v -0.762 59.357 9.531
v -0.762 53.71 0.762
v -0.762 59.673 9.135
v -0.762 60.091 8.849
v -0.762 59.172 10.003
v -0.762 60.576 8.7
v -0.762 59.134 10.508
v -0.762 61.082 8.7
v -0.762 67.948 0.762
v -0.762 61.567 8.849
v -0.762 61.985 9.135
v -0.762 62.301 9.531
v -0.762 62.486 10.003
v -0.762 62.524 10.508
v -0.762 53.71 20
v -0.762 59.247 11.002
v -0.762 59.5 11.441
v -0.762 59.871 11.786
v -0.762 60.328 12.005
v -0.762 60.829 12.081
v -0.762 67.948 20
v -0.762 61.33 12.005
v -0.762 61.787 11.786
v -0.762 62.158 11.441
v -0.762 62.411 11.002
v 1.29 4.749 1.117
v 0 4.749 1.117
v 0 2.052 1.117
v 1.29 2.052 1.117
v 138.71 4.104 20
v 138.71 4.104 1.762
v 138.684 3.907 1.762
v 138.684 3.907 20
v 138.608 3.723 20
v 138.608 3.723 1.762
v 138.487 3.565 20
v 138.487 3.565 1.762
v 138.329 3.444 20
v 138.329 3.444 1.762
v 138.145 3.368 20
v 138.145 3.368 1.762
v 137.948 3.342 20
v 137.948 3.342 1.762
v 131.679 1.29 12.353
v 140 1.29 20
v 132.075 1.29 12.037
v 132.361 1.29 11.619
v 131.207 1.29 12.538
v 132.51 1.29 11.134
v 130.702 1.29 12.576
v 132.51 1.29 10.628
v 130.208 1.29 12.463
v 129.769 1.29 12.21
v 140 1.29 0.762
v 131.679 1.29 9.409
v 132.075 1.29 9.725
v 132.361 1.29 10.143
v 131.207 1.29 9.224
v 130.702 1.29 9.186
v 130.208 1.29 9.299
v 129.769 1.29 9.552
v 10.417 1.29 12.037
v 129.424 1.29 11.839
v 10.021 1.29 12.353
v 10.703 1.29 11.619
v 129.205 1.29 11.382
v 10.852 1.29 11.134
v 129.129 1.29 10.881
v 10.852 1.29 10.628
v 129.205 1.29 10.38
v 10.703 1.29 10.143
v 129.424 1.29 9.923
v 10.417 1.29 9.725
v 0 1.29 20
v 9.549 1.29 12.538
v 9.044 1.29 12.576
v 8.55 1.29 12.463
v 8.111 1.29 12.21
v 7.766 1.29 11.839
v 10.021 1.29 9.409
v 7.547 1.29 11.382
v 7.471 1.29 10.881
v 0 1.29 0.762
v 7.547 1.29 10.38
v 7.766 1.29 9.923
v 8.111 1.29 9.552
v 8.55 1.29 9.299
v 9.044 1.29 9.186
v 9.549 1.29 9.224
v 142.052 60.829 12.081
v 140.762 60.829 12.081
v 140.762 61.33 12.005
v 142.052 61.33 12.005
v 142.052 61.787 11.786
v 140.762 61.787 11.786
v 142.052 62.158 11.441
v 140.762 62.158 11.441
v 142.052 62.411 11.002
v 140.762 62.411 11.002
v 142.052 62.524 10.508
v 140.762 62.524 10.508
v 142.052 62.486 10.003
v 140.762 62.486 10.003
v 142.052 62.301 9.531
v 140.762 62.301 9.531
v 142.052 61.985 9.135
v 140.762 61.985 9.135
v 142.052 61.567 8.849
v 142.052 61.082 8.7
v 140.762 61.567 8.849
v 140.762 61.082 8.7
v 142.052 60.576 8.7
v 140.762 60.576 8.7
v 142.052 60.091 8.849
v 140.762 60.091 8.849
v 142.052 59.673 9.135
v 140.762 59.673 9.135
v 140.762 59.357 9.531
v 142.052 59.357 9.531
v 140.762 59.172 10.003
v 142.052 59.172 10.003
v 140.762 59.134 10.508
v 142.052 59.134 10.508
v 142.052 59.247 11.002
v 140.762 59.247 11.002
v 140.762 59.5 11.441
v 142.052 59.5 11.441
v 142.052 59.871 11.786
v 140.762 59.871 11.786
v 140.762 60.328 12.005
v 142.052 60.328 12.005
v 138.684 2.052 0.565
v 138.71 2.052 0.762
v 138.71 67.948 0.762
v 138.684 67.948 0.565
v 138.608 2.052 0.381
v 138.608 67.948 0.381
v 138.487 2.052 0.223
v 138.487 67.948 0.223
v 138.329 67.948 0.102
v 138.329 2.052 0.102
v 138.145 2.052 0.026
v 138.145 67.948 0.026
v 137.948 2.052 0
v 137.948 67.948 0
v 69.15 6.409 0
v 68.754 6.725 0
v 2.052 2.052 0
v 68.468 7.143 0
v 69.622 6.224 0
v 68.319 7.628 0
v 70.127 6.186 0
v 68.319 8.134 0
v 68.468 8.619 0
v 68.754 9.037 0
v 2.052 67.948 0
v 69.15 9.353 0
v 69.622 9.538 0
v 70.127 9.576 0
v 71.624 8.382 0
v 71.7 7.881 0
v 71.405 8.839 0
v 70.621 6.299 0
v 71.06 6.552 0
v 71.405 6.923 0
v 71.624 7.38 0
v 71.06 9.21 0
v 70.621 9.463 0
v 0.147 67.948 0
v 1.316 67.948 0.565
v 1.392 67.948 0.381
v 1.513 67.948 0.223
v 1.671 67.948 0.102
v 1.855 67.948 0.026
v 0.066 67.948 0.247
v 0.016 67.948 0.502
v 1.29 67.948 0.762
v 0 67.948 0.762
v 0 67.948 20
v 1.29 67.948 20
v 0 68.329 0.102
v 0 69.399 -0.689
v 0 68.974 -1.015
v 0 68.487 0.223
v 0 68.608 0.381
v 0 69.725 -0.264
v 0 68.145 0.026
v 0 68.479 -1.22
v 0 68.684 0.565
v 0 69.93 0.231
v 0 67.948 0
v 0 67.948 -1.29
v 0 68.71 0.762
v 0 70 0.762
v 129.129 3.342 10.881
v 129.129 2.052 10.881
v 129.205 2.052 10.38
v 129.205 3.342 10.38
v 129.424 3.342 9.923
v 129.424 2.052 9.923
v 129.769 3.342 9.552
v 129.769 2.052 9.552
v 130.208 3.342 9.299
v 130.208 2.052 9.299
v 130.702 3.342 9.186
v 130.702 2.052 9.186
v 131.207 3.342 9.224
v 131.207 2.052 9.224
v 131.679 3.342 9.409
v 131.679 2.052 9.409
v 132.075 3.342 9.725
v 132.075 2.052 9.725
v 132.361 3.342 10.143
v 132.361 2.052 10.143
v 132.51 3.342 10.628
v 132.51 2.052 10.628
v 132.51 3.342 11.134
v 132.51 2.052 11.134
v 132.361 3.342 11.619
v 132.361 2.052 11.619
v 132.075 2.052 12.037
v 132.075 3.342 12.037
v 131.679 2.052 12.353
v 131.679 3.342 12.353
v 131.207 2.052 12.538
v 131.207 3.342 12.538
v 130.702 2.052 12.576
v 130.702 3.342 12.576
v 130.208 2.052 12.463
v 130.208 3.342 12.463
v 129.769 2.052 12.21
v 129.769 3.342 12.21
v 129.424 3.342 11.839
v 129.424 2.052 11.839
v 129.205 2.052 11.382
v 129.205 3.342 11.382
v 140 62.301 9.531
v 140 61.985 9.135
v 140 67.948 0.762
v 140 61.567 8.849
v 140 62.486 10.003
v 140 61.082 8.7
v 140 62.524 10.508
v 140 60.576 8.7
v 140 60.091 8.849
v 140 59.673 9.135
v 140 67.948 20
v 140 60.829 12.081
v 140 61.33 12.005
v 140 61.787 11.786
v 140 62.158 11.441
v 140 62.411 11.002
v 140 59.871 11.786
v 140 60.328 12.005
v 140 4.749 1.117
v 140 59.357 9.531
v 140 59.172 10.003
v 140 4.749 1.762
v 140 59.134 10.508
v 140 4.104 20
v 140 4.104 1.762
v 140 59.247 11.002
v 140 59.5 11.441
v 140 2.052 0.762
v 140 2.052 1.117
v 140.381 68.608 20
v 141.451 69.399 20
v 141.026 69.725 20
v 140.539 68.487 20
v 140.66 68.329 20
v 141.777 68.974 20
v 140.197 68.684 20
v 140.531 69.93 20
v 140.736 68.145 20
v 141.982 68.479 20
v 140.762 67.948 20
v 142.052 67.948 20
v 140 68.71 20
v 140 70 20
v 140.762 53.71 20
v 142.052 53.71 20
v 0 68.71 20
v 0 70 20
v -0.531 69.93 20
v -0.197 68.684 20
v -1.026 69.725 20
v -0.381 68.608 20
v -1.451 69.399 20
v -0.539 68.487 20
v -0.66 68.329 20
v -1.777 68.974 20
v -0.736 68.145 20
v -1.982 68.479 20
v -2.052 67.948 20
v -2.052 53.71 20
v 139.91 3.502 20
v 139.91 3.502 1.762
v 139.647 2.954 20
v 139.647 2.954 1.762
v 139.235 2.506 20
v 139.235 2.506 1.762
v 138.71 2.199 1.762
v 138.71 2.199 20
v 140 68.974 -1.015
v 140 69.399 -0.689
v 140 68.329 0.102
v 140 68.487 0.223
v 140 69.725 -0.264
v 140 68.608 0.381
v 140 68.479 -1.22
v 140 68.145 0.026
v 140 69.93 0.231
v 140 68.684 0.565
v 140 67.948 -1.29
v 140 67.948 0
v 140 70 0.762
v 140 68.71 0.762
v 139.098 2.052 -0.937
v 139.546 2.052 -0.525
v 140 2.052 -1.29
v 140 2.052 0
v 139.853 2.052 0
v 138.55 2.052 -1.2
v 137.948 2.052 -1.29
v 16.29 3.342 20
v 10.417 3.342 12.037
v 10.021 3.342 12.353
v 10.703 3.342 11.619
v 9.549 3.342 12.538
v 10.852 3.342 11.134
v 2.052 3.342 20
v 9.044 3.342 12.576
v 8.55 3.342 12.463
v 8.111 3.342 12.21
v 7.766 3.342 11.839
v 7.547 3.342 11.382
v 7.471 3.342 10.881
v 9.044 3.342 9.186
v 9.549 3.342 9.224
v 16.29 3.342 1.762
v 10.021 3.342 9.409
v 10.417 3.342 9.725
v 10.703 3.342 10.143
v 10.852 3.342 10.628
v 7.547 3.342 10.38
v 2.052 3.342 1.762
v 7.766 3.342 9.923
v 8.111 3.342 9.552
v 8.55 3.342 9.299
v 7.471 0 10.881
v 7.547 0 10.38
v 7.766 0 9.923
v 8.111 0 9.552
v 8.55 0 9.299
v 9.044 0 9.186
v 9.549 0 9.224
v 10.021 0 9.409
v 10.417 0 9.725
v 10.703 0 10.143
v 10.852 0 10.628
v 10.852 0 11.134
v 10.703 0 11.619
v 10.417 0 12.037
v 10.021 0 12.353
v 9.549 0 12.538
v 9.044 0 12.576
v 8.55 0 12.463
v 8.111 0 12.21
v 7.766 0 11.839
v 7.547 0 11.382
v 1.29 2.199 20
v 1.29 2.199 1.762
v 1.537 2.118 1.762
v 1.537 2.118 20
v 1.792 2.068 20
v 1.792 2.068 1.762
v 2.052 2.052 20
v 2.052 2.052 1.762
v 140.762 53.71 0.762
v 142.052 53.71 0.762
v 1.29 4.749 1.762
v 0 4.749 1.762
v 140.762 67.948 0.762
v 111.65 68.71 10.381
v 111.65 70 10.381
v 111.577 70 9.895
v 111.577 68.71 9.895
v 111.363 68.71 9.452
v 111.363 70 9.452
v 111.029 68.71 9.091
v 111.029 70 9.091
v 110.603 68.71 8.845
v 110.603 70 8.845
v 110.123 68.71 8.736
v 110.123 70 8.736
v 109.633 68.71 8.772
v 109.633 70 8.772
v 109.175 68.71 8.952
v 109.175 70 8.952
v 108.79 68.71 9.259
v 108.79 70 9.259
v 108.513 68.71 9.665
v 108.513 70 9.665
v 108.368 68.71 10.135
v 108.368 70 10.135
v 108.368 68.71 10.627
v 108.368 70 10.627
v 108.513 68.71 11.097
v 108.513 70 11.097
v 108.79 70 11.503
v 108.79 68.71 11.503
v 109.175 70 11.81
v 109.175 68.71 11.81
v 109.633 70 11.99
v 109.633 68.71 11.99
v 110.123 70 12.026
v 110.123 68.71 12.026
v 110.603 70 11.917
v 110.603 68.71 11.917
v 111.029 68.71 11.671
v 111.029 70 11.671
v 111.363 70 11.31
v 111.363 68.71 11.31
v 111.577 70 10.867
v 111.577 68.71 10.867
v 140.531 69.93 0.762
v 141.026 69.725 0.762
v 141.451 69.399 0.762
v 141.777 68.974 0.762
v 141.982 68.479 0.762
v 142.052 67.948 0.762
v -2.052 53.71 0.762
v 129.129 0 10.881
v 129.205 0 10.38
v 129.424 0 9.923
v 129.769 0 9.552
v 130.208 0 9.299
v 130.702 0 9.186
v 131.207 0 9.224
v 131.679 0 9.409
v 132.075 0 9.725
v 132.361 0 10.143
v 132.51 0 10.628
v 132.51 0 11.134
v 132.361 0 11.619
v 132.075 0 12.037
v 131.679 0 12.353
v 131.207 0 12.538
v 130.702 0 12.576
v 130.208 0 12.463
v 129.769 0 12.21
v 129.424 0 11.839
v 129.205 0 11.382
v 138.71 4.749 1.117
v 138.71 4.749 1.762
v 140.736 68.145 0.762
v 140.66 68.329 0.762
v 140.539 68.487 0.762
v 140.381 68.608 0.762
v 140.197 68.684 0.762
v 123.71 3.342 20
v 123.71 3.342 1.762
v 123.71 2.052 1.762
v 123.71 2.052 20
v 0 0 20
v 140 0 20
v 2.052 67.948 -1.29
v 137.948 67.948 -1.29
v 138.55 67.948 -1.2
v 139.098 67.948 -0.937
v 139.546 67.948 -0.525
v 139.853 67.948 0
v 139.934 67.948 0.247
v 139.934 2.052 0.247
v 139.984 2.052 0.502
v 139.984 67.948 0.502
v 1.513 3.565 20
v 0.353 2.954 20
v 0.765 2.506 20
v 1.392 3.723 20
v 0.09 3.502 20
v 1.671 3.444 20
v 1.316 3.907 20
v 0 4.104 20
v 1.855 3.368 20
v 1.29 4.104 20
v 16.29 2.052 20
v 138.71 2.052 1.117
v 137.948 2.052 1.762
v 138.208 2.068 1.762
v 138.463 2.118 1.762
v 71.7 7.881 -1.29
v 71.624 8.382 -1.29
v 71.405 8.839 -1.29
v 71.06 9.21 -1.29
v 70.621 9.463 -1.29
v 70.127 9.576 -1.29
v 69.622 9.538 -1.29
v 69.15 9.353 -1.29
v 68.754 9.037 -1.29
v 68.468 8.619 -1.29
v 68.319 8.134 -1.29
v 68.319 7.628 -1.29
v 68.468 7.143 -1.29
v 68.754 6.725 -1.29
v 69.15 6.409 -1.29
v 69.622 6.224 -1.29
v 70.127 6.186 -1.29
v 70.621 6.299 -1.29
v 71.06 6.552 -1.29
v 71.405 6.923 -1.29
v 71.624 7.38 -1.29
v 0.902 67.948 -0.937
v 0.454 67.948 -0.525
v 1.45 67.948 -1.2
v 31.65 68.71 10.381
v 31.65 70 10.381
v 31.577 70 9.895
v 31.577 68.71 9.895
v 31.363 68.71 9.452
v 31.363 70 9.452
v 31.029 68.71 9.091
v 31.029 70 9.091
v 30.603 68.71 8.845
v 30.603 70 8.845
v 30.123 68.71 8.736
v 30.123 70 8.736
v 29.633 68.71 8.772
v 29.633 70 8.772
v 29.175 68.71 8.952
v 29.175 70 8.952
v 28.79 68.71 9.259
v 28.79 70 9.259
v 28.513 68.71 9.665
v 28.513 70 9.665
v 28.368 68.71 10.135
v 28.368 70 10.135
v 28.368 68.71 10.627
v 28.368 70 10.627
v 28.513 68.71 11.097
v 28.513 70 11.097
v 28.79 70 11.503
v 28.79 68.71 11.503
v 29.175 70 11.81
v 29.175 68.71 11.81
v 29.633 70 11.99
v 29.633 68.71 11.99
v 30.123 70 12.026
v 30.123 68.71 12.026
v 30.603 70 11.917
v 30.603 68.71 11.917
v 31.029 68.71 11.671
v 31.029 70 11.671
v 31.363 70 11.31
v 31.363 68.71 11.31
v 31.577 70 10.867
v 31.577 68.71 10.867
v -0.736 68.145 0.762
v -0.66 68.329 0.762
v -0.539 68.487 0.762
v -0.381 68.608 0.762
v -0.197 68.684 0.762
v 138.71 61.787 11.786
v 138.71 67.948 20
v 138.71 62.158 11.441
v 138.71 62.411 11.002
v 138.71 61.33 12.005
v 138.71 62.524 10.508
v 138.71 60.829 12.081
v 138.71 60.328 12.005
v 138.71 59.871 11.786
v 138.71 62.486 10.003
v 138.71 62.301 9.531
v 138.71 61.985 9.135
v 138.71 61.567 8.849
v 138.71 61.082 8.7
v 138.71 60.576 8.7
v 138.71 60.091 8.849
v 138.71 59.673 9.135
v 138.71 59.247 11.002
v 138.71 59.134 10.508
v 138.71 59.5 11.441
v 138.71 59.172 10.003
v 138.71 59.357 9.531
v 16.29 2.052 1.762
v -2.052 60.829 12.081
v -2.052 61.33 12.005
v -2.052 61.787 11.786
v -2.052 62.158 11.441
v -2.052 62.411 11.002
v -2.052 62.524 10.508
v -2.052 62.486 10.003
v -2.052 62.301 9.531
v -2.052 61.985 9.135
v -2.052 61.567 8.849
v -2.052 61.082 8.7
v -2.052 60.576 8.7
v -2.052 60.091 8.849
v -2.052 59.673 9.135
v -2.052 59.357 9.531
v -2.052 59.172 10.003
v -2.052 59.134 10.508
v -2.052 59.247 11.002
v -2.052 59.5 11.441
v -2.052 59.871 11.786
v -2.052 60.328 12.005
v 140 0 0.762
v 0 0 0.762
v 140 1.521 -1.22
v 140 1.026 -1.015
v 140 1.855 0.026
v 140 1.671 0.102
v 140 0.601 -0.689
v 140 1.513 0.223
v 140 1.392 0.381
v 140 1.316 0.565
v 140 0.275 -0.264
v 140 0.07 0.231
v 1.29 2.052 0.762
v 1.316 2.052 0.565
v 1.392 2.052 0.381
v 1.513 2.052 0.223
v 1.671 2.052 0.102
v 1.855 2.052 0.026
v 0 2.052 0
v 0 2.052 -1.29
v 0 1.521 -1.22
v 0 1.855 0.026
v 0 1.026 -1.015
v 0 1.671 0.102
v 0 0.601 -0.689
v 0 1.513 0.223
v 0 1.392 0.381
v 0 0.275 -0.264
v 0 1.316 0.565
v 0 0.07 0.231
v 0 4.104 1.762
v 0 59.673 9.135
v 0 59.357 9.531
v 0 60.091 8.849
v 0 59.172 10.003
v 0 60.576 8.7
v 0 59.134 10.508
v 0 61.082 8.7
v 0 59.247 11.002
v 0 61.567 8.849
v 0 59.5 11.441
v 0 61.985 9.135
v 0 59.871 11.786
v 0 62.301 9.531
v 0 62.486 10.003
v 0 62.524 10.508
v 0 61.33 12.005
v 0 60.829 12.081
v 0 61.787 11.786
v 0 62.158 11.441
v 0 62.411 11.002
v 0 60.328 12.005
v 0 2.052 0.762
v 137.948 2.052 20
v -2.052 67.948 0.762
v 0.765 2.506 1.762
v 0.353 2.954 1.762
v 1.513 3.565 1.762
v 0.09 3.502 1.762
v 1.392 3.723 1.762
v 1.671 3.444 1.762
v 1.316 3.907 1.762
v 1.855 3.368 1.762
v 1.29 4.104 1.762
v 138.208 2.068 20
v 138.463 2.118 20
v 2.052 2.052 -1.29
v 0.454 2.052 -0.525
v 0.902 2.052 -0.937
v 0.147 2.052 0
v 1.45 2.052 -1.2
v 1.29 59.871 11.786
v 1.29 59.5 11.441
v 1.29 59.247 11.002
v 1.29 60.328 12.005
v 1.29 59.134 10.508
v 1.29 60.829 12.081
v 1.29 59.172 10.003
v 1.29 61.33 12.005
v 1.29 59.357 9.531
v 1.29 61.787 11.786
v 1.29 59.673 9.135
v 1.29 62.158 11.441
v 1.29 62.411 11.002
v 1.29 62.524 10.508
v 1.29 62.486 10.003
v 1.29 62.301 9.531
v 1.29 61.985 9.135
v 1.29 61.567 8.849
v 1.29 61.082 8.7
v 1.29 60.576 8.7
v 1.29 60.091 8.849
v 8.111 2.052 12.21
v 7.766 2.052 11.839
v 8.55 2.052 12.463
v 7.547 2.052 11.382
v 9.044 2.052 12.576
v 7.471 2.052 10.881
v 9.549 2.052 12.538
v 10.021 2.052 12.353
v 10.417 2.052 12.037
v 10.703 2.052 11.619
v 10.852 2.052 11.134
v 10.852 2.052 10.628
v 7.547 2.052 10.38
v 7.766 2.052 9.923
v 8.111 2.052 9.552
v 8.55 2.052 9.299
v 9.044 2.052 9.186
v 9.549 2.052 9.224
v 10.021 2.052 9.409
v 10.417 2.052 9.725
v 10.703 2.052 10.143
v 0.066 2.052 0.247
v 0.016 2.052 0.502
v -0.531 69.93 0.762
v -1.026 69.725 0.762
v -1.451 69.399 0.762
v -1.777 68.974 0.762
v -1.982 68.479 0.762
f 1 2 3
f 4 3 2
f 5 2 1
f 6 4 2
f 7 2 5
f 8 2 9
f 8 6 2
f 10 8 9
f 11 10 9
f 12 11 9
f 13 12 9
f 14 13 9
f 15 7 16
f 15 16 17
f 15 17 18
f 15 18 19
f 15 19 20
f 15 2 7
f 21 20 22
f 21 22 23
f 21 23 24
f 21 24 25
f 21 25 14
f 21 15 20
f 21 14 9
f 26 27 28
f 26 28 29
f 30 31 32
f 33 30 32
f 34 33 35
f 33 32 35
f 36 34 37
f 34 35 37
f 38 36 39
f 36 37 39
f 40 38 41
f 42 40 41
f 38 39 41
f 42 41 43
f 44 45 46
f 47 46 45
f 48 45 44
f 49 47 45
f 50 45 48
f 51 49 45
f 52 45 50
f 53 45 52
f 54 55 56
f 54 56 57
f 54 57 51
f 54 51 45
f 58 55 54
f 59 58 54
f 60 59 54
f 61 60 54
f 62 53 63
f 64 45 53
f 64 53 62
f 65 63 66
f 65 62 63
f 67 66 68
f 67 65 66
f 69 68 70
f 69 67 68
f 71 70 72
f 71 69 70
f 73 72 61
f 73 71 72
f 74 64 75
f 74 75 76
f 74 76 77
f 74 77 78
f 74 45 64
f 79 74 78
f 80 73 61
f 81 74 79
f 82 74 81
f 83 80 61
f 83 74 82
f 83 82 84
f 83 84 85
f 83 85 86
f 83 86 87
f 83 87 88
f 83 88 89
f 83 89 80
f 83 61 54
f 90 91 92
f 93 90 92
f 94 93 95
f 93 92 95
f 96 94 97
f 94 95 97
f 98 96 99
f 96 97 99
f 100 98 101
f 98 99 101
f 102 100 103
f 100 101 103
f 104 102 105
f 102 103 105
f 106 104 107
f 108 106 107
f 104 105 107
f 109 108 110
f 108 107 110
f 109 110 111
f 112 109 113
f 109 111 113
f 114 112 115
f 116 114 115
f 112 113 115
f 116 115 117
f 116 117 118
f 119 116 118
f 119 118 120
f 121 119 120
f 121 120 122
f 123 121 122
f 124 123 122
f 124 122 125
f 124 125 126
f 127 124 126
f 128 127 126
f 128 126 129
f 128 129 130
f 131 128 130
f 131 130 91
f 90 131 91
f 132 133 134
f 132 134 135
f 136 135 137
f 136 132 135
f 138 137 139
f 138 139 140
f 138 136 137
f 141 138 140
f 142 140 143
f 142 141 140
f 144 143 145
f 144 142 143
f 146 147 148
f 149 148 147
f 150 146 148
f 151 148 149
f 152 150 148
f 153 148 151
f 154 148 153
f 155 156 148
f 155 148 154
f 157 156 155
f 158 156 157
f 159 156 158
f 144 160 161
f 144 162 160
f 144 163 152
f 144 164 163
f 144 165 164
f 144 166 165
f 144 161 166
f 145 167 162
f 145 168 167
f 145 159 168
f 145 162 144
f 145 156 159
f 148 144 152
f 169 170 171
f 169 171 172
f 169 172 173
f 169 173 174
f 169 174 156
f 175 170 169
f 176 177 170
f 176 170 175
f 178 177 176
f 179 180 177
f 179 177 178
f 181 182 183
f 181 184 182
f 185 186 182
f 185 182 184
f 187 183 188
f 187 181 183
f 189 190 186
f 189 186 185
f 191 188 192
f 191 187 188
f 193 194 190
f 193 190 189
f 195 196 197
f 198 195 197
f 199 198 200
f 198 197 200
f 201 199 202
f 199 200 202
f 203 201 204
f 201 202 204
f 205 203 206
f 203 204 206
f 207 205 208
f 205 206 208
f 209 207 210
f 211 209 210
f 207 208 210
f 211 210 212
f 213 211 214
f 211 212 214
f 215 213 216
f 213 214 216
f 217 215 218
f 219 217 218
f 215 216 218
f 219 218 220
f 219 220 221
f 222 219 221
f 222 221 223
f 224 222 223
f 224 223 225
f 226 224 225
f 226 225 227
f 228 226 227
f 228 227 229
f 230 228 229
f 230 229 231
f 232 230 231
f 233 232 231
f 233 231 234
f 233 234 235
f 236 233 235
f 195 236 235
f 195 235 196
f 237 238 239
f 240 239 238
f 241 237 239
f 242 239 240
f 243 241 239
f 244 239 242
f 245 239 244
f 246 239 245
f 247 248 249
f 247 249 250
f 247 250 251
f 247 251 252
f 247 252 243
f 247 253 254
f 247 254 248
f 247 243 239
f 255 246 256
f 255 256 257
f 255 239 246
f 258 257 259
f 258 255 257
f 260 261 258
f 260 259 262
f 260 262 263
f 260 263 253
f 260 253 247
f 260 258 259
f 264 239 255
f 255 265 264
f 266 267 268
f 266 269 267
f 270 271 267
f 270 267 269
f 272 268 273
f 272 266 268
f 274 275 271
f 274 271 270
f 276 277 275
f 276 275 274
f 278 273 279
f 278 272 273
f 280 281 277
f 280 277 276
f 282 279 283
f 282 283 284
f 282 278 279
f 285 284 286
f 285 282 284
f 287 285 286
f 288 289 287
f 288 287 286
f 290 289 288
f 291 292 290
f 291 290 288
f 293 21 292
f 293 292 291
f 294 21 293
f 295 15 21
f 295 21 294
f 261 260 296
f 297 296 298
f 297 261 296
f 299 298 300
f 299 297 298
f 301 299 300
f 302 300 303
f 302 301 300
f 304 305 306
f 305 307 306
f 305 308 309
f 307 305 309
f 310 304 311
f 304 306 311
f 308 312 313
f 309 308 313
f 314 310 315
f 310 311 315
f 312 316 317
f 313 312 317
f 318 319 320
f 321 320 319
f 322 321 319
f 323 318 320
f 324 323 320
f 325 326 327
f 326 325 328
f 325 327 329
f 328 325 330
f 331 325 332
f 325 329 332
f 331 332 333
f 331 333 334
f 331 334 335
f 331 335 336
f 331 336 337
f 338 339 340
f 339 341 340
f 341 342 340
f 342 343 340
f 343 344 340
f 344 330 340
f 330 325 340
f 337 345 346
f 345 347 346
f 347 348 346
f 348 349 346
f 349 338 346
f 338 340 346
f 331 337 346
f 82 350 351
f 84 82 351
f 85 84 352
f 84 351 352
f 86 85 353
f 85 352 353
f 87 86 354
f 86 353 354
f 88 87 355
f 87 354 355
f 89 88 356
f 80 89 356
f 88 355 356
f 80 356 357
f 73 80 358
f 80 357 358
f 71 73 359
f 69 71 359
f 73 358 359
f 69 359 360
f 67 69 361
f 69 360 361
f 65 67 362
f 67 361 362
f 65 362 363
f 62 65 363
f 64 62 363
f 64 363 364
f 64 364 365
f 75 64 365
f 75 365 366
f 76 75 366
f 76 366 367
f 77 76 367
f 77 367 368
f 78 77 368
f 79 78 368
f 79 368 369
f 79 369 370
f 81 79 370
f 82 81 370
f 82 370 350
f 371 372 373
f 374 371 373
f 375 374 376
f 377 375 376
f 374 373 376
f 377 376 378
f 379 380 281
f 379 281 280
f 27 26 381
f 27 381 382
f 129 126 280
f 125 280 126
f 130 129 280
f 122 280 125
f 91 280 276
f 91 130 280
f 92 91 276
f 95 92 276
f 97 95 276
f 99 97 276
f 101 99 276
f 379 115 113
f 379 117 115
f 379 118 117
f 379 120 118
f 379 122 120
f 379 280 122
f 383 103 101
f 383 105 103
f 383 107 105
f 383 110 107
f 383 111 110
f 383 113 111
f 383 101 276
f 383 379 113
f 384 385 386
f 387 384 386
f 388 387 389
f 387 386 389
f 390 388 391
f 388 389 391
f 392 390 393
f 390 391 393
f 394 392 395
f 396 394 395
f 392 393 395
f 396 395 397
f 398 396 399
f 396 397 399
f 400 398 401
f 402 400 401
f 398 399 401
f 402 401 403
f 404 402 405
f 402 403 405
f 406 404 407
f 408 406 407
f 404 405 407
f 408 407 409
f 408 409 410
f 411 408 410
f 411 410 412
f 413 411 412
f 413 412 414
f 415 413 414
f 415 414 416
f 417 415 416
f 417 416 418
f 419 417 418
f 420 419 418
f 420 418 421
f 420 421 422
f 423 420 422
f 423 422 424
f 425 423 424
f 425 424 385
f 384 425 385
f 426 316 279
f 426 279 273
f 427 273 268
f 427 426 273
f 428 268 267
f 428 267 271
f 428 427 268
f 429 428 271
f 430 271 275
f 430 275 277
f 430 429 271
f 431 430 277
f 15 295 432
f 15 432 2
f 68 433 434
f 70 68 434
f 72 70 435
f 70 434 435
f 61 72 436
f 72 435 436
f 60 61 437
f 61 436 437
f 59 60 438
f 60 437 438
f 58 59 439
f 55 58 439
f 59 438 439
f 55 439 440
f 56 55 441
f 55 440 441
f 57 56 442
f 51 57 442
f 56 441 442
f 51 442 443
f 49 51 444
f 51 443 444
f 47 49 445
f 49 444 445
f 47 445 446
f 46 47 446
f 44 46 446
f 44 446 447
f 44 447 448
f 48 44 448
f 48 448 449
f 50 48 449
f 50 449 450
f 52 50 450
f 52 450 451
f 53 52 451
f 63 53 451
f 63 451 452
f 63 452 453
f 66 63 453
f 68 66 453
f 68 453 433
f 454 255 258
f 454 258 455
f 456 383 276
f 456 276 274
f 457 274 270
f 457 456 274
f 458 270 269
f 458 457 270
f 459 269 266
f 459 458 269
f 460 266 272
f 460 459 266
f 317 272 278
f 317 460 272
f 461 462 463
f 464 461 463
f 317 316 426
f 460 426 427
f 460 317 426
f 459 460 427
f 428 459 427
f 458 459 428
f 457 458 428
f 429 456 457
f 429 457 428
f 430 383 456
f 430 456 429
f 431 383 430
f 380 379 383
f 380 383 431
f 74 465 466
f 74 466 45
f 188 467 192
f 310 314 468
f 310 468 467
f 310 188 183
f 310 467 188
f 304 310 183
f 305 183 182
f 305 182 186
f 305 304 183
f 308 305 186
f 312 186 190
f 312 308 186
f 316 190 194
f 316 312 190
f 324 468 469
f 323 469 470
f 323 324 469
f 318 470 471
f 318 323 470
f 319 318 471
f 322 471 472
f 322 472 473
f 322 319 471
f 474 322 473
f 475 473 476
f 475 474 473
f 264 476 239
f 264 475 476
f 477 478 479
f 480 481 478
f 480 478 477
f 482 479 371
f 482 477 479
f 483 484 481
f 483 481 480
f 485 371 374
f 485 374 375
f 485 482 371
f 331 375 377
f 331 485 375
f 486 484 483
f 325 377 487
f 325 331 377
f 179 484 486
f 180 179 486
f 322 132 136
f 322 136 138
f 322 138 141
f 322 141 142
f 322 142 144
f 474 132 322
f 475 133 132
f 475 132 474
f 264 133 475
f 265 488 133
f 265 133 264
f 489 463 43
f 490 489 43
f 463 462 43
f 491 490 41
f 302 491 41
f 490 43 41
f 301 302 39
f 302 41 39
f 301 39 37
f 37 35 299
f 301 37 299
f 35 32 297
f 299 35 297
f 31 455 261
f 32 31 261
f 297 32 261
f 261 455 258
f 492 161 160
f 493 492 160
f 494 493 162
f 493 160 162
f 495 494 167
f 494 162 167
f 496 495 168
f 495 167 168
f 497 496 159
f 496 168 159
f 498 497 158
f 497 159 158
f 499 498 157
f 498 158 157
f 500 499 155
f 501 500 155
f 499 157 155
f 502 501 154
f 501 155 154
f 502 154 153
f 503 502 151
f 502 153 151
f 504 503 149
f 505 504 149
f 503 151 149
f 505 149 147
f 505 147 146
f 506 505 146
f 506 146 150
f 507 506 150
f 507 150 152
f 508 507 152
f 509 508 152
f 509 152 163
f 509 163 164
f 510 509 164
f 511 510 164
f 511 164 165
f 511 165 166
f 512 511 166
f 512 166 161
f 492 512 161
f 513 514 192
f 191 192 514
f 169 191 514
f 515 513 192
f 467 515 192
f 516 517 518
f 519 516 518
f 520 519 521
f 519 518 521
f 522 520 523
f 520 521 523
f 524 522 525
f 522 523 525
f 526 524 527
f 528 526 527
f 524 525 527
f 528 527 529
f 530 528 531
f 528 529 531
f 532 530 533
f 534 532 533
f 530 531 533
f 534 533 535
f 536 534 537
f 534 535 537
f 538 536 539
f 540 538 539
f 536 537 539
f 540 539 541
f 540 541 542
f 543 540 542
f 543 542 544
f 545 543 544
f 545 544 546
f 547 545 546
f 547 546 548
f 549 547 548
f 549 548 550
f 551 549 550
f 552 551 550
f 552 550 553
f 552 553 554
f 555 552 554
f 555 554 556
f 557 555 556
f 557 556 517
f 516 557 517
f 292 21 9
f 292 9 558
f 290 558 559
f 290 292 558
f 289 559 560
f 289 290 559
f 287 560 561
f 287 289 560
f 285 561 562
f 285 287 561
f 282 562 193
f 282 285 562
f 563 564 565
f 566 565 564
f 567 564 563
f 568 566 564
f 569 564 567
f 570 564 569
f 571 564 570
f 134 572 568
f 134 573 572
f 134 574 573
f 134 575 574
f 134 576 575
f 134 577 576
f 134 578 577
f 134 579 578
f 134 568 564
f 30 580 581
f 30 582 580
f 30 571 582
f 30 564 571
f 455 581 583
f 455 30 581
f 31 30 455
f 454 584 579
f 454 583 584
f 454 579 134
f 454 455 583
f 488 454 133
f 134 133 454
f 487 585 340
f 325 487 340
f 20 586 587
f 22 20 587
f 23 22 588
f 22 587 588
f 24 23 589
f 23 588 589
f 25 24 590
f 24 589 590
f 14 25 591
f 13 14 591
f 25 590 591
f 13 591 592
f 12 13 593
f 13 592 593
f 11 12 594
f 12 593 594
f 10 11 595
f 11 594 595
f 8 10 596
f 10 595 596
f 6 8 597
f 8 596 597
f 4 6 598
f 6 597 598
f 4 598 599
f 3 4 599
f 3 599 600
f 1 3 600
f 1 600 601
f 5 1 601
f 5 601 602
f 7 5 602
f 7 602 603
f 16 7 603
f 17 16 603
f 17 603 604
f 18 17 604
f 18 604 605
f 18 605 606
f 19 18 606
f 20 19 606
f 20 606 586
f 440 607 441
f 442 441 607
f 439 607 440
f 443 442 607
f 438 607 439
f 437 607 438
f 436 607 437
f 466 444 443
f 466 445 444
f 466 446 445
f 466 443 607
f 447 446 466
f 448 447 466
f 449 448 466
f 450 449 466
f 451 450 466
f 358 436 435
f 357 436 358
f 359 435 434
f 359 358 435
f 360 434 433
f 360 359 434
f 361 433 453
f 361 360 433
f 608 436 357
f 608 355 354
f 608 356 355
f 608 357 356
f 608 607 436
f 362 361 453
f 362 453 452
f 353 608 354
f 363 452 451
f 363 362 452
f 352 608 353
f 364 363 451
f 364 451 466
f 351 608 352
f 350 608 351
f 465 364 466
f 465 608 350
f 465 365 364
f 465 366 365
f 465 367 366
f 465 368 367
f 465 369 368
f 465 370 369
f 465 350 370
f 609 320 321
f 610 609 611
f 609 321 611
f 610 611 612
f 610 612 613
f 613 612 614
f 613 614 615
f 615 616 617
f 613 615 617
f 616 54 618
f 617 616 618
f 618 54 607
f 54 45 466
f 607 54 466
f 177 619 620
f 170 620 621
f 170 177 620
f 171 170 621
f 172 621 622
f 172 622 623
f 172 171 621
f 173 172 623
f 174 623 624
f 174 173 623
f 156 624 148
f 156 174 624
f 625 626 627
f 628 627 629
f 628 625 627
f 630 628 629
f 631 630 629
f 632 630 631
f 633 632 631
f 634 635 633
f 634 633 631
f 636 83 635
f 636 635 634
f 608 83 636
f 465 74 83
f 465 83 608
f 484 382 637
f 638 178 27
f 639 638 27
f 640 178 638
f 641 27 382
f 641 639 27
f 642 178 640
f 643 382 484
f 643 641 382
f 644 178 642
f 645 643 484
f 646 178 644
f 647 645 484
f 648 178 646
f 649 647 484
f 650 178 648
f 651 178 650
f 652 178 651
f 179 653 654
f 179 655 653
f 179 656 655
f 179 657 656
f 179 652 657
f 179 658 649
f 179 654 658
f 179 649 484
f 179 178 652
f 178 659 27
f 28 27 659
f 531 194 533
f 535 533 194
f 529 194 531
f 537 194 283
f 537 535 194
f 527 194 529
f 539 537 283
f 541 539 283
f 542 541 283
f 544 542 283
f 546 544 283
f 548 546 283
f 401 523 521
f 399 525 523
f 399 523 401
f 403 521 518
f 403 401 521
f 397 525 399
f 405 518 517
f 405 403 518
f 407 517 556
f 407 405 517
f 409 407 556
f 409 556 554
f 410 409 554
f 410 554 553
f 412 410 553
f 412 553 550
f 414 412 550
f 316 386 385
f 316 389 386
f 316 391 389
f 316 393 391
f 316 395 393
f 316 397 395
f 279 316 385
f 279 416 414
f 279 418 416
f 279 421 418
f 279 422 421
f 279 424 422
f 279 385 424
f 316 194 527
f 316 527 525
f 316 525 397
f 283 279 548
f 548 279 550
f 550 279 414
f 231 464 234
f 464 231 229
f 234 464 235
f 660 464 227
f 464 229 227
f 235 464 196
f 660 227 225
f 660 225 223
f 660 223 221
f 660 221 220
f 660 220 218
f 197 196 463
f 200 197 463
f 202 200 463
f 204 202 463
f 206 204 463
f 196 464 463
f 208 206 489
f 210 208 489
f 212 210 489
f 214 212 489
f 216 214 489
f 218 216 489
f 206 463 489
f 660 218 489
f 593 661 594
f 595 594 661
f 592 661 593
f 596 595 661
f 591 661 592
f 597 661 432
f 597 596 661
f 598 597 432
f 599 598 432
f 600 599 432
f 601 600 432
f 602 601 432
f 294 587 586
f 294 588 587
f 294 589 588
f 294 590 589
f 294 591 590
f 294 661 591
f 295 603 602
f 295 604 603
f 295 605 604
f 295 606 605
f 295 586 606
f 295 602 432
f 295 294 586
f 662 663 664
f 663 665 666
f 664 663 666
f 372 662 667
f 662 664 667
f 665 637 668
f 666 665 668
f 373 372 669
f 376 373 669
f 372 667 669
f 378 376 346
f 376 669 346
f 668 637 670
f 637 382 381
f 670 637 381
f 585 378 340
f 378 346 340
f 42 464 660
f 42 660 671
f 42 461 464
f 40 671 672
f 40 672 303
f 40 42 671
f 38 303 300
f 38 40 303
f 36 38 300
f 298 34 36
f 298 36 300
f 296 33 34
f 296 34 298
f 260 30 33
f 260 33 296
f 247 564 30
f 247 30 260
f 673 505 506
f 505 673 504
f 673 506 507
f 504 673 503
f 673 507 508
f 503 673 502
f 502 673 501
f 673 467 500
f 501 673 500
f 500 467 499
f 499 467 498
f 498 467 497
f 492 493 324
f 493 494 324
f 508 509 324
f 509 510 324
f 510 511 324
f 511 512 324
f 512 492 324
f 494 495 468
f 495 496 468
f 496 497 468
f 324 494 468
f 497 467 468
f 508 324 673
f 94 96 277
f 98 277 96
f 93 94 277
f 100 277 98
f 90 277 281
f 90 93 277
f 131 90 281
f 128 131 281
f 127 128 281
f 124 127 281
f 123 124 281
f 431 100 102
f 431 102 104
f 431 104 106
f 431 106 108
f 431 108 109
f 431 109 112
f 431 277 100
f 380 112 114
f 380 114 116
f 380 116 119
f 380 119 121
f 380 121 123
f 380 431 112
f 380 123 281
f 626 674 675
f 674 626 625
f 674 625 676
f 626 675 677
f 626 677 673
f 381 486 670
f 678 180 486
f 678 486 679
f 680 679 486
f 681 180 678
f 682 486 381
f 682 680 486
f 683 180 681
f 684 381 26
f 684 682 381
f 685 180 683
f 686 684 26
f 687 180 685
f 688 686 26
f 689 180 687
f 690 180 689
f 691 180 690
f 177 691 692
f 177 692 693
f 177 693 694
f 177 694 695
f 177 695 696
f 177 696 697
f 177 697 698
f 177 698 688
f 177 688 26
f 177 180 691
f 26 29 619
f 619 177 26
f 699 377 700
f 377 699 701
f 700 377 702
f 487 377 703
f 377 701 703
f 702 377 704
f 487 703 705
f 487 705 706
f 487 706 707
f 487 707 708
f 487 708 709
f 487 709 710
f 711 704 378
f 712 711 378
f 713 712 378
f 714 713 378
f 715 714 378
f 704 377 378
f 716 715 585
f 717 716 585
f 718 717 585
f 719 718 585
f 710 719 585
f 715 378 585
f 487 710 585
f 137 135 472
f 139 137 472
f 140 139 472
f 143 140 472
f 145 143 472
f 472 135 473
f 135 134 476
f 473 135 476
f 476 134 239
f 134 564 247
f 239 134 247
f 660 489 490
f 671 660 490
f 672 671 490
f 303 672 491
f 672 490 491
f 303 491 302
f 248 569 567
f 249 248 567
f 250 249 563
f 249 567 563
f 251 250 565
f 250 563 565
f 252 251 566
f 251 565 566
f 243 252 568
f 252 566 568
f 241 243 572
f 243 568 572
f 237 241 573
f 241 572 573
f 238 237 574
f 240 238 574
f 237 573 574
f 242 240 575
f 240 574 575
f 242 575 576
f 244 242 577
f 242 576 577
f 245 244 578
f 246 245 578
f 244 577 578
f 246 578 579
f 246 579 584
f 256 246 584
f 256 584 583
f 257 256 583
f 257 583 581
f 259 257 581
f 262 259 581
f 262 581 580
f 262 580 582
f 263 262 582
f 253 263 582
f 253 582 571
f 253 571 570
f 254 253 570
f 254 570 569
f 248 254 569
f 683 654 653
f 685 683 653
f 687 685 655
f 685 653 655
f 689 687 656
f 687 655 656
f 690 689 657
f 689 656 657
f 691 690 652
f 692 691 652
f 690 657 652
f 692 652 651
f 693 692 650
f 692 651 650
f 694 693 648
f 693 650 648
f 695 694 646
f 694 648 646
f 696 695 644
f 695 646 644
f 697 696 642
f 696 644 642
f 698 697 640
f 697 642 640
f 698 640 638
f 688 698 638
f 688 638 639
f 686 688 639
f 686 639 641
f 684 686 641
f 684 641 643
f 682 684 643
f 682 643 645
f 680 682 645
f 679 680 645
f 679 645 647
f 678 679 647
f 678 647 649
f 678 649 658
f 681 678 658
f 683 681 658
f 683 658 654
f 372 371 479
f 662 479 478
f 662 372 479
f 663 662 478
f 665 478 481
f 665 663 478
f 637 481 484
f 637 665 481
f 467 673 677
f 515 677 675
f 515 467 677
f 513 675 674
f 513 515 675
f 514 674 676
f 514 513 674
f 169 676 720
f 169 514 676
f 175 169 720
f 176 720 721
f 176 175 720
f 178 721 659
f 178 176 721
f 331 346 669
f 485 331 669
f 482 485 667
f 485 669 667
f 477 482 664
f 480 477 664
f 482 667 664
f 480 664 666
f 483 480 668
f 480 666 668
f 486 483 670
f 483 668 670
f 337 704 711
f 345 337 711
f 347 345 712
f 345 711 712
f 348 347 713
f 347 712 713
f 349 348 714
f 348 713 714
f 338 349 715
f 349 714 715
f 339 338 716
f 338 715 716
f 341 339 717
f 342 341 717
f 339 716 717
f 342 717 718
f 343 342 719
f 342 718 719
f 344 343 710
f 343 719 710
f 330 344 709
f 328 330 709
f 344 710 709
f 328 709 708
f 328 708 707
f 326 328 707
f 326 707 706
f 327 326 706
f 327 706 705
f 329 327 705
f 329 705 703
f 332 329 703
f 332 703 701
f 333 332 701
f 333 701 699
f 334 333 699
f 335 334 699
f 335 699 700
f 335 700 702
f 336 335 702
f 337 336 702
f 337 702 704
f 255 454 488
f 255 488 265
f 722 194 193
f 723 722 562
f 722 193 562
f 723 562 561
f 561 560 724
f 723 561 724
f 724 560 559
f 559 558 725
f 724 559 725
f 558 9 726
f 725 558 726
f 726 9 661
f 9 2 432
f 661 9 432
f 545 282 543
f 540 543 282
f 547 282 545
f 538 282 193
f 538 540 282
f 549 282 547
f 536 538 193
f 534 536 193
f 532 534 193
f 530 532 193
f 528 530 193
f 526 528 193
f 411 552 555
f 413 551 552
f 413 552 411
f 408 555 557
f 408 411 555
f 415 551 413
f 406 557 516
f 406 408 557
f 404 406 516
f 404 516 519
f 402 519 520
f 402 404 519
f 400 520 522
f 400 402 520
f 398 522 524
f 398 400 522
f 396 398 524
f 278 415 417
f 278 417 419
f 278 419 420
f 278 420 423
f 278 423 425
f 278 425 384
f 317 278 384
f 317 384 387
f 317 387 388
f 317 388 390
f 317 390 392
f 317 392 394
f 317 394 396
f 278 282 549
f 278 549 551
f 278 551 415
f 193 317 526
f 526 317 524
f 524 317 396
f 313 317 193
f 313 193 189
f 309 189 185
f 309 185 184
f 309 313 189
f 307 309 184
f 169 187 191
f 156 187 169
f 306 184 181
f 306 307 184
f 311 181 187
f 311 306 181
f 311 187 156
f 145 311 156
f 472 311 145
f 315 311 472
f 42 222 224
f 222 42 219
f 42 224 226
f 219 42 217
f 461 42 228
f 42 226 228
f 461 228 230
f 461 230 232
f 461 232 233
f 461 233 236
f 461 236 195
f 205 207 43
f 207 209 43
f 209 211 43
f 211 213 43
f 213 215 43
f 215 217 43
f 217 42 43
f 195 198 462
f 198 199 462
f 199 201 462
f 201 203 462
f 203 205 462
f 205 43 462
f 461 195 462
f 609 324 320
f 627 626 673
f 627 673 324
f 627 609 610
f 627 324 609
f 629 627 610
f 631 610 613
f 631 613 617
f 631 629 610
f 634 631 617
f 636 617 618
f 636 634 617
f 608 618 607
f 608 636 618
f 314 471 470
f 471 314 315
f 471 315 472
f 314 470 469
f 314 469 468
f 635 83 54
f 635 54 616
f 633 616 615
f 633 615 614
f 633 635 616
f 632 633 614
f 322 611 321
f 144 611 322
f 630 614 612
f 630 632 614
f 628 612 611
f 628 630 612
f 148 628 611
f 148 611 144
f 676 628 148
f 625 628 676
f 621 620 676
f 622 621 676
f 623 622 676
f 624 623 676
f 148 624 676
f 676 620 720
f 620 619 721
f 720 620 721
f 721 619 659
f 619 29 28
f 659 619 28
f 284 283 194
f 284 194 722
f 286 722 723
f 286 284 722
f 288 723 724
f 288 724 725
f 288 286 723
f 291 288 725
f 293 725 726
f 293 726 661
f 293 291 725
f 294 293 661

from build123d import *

# Parameters (mm, degrees)
SKETCH1_W                        = 140
SKETCH1_H                        = 70
BASE_FLANGE1_DEPTH               = 1.29
EDGE_FLANGE1_STRIP_W             = 6.684
EDGE_FLANGE1_STRIP_H             = 1.29
EDGE_FLANGE1_STRIP_CUT_DEPTH     = 140
EDGE_FLANGE1_DEPTH               = 140
EDGE_FLANGE2_STRIP_W             = 6.684
EDGE_FLANGE2_STRIP_H             = 1.29
EDGE_FLANGE2_STRIP_CUT_DEPTH     = 140
EDGE_FLANGE2_DEPTH               = 140
EDGE_FLANGE3_STRIP_W             = 6.684
EDGE_FLANGE3_STRIP_H             = 1.29
EDGE_FLANGE3_STRIP_CUT_DEPTH     = 65.896
EDGE_FLANGE3_DEPTH               = 65.896
EDGE_FLANGE4_STRIP_W             = 6.684
EDGE_FLANGE4_STRIP_H             = 1.29
EDGE_FLANGE4_STRIP_CUT_DEPTH     = 65.896
EDGE_FLANGE4_DEPTH               = 65.896
EDGE_FLANGE6_START               = 1.117
EDGE_FLANGE6_DEPTH               = 18.883
EDGE_FLANGE6_2_DEPTH             = 0.645
EDGE_FLANGE6_START_2             = 1.762
EDGE_FLANGE6_3_DEPTH             = 18.238
EDGE_FLANGE8_START               = 1.117
EDGE_FLANGE8_DEPTH               = 18.883
EDGE_FLANGE8_2_DEPTH             = 0.645
EDGE_FLANGE8_START_2             = 1.762
EDGE_FLANGE8_3_DEPTH             = 18.238
M3_CLEARANCE_HOLE1_D             = 3.4
EDGE_FLANGE9_DEPTH               = 19.238
EDGE_FLANGE10_DEPTH              = 19.238
TAP_DRILL_FOR_M4X0_7_TAP1_REACH  = 161.621
TAP_DRILL_FOR_M4X0_7_TAP1_BORE_R = 1.65
M3_CLEARANCE_HOLE3_D             = 3.4
M3_CLEARANCE_HOLE3_DEPTH         = 3.342
M3_CLEARANCE_HOLE4_D             = 3.4


# Read off the part's stored shape, not the designer's step: Edge-Flange6, Edge-Flange8
# Sheet-metal steps are written as plain solids
with BuildPart() as part:
    # Sketch1 → Base-Flange1 (new body)
    with BuildSketch(Plane.XY):
        with Locations((70, 35)):
            Rectangle(SKETCH1_W, SKETCH1_H)
    extrude(amount=-BASE_FLANGE1_DEPTH)

    # Edge-Flange1 strip (across the edge) → Edge-Flange1 strip cut (cut)
    with BuildSketch(Plane(origin=(140, 70, 0), x_dir=(0, -1, 0), z_dir=(-1, 0, 0))):
        with Locations((-1.29, -0.645)):
            Rectangle(EDGE_FLANGE1_STRIP_W, EDGE_FLANGE1_STRIP_H)
    extrude(amount=EDGE_FLANGE1_STRIP_CUT_DEPTH, mode=Mode.SUBTRACT)

    # Edge-Flange1 section (across the edge) → Edge-Flange1 (add)
    with BuildSketch(Plane(origin=(140, 70, 0), x_dir=(0, -1, 0), z_dir=(-1, 0, 0))):
        with BuildLine():
            Line((0, 0.762), (0, 20))
            Line((0, 20), (1.29, 20))
            Line((1.29, 20), (1.29, 0.762))
            ThreePointArc((1.29, 0.762), (1.513184633, 0.223184633), (2.052, 0))
            Line((2.052, 0), (2.052, -1.29))
            ThreePointArc((2.052, -1.29), (0.601016885, -0.688983115), (0, 0.762))
        make_face()
    extrude(amount=EDGE_FLANGE1_DEPTH)

    # Edge-Flange2 strip (across the edge) → Edge-Flange2 strip cut (cut)
    with BuildSketch(Plane.YZ):
        with Locations((-1.29, -0.645)):
            Rectangle(EDGE_FLANGE2_STRIP_W, EDGE_FLANGE2_STRIP_H)
    extrude(amount=EDGE_FLANGE2_STRIP_CUT_DEPTH, mode=Mode.SUBTRACT)

    # Edge-Flange2 section (across the edge) → Edge-Flange2 (add)
    with BuildSketch(Plane.YZ):
        with BuildLine():
            Line((0, 0.762), (0, 20))
            Line((0, 20), (1.29, 20))
            Line((1.29, 20), (1.29, 0.762))
            ThreePointArc((1.29, 0.762), (1.513184633, 0.223184633), (2.052, 0))
            Line((2.052, 0), (2.052, -1.29))
            ThreePointArc((2.052, -1.29), (0.601016885, -0.688983115), (0, 0.762))
        make_face()
    extrude(amount=EDGE_FLANGE2_DEPTH)

    # Edge-Flange3 strip (across the edge) → Edge-Flange3 strip cut (cut)
    with BuildSketch(Plane.XZ.offset(-67.948)):
        with Locations((-1.29, -0.645)):
            Rectangle(EDGE_FLANGE3_STRIP_W, EDGE_FLANGE3_STRIP_H)
    extrude(amount=EDGE_FLANGE3_STRIP_CUT_DEPTH, mode=Mode.SUBTRACT)

    # Edge-Flange3 section (across the edge) → Edge-Flange3 (add)
    with BuildSketch(Plane.XZ.offset(-67.948)):
        with BuildLine():
            Line((0, 0.762), (0, 20))
            Line((0, 20), (1.29, 20))
            Line((1.29, 20), (1.29, 0.762))
            ThreePointArc((1.29, 0.762), (1.513184633, 0.223184633), (2.052, 0))
            Line((2.052, 0), (2.052, -1.29))
            ThreePointArc((2.052, -1.29), (0.601016885, -0.688983115), (0, 0.762))
        make_face()
    extrude(amount=EDGE_FLANGE3_DEPTH)

    # Edge-Flange4 strip (across the edge) → Edge-Flange4 strip cut (cut)
    with BuildSketch(Plane(origin=(140, 2.052, 0), x_dir=(-1, 0, 0), z_dir=(0, 1, 0))):
        with Locations((-1.29, -0.645)):
            Rectangle(EDGE_FLANGE4_STRIP_W, EDGE_FLANGE4_STRIP_H)
    extrude(amount=EDGE_FLANGE4_STRIP_CUT_DEPTH, mode=Mode.SUBTRACT)

    # Edge-Flange4 section (across the edge) → Edge-Flange4 (add)
    with BuildSketch(Plane(origin=(140, 2.052, 0), x_dir=(-1, 0, 0), z_dir=(0, 1, 0))):
        with BuildLine():
            Line((0, 0.762), (0, 20))
            Line((0, 20), (1.29, 20))
            Line((1.29, 20), (1.29, 0.762))
            ThreePointArc((1.29, 0.762), (1.513184633, 0.223184633), (2.052, 0))
            Line((2.052, 0), (2.052, -1.29))
            ThreePointArc((2.052, -1.29), (0.601016885, -0.688983115), (0, 0.762))
        make_face()
    extrude(amount=EDGE_FLANGE4_DEPTH)

    # Edge-Flange6 outline → Edge-Flange6 (cut)
    with BuildSketch(Plane.XY.offset(EDGE_FLANGE6_START)):
        with BuildLine():
            Line((1.29, 2.052), (1.29, 2.198728366))
            ThreePointArc((1.29, 2.198728366), (0.352834322, 2.953547915), (0, 4.104))
            Line((0, 4.104), (0, 2.052))
            Line((0, 2.052), (1.29, 2.052))
        make_face()
    extrude(amount=EDGE_FLANGE6_DEPTH, mode=Mode.SUBTRACT)

    # Edge-Flange6 2 outline → Edge-Flange6 2 (cut)
    with BuildSketch(Plane.XY.offset(EDGE_FLANGE6_START)):
        with BuildLine():
            ThreePointArc((0, 4.104), (0.352834322, 2.953547915), (1.29, 2.198728366))
            Line((1.29, 2.198728366), (1.29, 4.749))
            Line((1.29, 4.749), (0, 4.749))
            Line((0, 4.749), (0, 4.104))
        make_face()
    extrude(amount=EDGE_FLANGE6_2_DEPTH, mode=Mode.SUBTRACT)

    # Edge-Flange6 3 outline → Edge-Flange6 3 (add)
    with BuildSketch(Plane.XY.offset(EDGE_FLANGE6_START_2)):
        with BuildLine():
            Line((2.052, 2.052), (16.29, 2.052))
            Line((16.29, 2.052), (16.29, 3.342))
            Line((16.29, 3.342), (2.052, 3.342))
            ThreePointArc((2.052, 3.342), (1.513184633, 3.565184633), (1.29, 4.104))
            Line((1.29, 4.104), (1.29, 2.198728366))
            ThreePointArc((1.29, 2.198728366), (1.664000898, 2.089015956), (2.052, 2.052))
        make_face()
    extrude(amount=EDGE_FLANGE6_3_DEPTH)

    # Edge-Flange8 outline → Edge-Flange8 (cut)
    with BuildSketch(Plane.XY.offset(EDGE_FLANGE8_START)):
        with BuildLine():
            ThreePointArc((140, 4.104), (139.647165678, 2.953547915), (138.71, 2.198728366))
            Line((138.71, 2.198728366), (138.71, 2.052))
            Line((138.71, 2.052), (140, 2.052))
            Line((140, 2.052), (140, 4.104))
        make_face()
    extrude(amount=EDGE_FLANGE8_DEPTH, mode=Mode.SUBTRACT)

    # Edge-Flange8 2 outline → Edge-Flange8 2 (cut)
    with BuildSketch(Plane.XY.offset(EDGE_FLANGE8_START)):
        with BuildLine():
            Line((138.71, 4.749), (138.71, 2.198728366))
            ThreePointArc((138.71, 2.198728366), (139.647165678, 2.953547915), (140, 4.104))
            Line((140, 4.104), (140, 4.749))
            Line((140, 4.749), (138.71, 4.749))
        make_face()
    extrude(amount=EDGE_FLANGE8_2_DEPTH, mode=Mode.SUBTRACT)

    # Edge-Flange8 3 outline → Edge-Flange8 3 (add)
    with BuildSketch(Plane.XY.offset(EDGE_FLANGE8_START_2)):
        with BuildLine():
            Line((123.71, 2.052), (137.948, 2.052))
            ThreePointArc((137.948, 2.052), (138.335999102, 2.089015956), (138.71, 2.198728366))
            Line((138.71, 2.198728366), (138.71, 4.104))
            ThreePointArc((138.71, 4.104), (138.486815367, 3.565184633), (137.948, 3.342))
            Line((137.948, 3.342), (123.71, 3.342))
            Line((123.71, 3.342), (123.71, 2.052))
        make_face()
    extrude(amount=EDGE_FLANGE8_3_DEPTH)

    # M3 Clearance Hole1 (through all)
    with Locations(Plane(origin=(34.266060613, 19.783275694, -1.29), x_dir=(-1, 0, 0), z_dir=(0, 0, -1))):
        with Locations((-35.733939387, -11.902275694)):
            Hole(M3_CLEARANCE_HOLE1_D / 2)

    # Edge-Flange9 section (across the edge) → Edge-Flange9 (add)
    with BuildSketch(Plane(origin=(140.762, 68.71, 0.762), x_dir=(-1, 0, 0), z_dir=(0, 0, 1))):
        with BuildLine():
            Line((-1.29, 0.762), (-1.29, 15))
            Line((-1.29, 15), (0, 15))
            Line((0, 15), (0, 0.762))
            ThreePointArc((0, 0.762), (0.223184633, 0.223184633), (0.762, 0))
            Line((0.762, 0), (0.762, -1.29))
            ThreePointArc((0.762, -1.29), (-0.688983115, -0.688983115), (-1.29, 0.762))
        make_face()
    extrude(amount=EDGE_FLANGE9_DEPTH)

    # Edge-Flange10 section (across the edge) → Edge-Flange10 (add)
    with BuildSketch(Plane(origin=(-0.762, 68.71, 20), x_dir=(1, 0, 0), z_dir=(0, 0, -1))):
        with BuildLine():
            Line((-1.29, 0.762), (-1.29, 15))
            Line((-1.29, 15), (0, 15))
            Line((0, 15), (0, 0.762))
            ThreePointArc((0, 0.762), (0.223184633, 0.223184633), (0.762, 0))
            Line((0.762, 0), (0.762, -1.29))
            ThreePointArc((0.762, -1.29), (-0.688983115, -0.688983115), (-1.29, 0.762))
        make_face()
    extrude(amount=EDGE_FLANGE10_DEPTH)

    # Tap Drill for M4x0.7 Tap1 bore → Tap Drill for M4x0.7 Tap1 (cut, up to next)
    with BuildSketch(Plane(origin=(0, 70, 0), x_dir=(1, 0, 0), z_dir=(0, 1, 0)), mode=Mode.PRIVATE) as tap_drill_for_m4x0_7_tap1_sk1:
        with Locations((30, -10.381)):
            Circle(TAP_DRILL_FOR_M4X0_7_TAP1_BORE_R)
    tap_drill_for_m4x0_7_tap1_tool1 = extrude(tap_drill_for_m4x0_7_tap1_sk1.sketch, amount=-TAP_DRILL_FOR_M4X0_7_TAP1_REACH, mode=Mode.PRIVATE) & part.part
    # Tap Drill for M4x0.7 Tap1 bore → Tap Drill for M4x0.7 Tap1 (cut, up to next)
    with BuildSketch(Plane(origin=(0, 70, 0), x_dir=(1, 0, 0), z_dir=(0, 1, 0)), mode=Mode.PRIVATE) as tap_drill_for_m4x0_7_tap1_sk2:
        with Locations((110, -10.381)):
            Circle(TAP_DRILL_FOR_M4X0_7_TAP1_BORE_R)
    tap_drill_for_m4x0_7_tap1_tool2 = extrude(tap_drill_for_m4x0_7_tap1_sk2.sketch, amount=-TAP_DRILL_FOR_M4X0_7_TAP1_REACH, mode=Mode.PRIVATE) & part.part
    add(tap_drill_for_m4x0_7_tap1_tool1.solids().sort_by_distance((30, 70, 10.381))[0], mode=Mode.SUBTRACT)
    add(tap_drill_for_m4x0_7_tap1_tool2.solids().sort_by_distance((110, 70, 10.381))[0], mode=Mode.SUBTRACT)

    # M3 Clearance Hole3
    with Locations(Plane(origin=(0, 3.342, 0), x_dir=(1, 0, 0), z_dir=(0, 1, 0))):
        with Locations((9.171, -10.881), (130.829, -10.881)):
            Hole(M3_CLEARANCE_HOLE3_D / 2, depth=M3_CLEARANCE_HOLE3_DEPTH)

    # M3 Clearance Hole4 (through all)
    with Locations(Plane(origin=(142.052, 0, 0), x_dir=(0, 0, -1), z_dir=(1, 0, 0))):
        with Locations((-10.381, 60.829)):
            Hole(M3_CLEARANCE_HOLE4_D / 2)


solid = part.part
